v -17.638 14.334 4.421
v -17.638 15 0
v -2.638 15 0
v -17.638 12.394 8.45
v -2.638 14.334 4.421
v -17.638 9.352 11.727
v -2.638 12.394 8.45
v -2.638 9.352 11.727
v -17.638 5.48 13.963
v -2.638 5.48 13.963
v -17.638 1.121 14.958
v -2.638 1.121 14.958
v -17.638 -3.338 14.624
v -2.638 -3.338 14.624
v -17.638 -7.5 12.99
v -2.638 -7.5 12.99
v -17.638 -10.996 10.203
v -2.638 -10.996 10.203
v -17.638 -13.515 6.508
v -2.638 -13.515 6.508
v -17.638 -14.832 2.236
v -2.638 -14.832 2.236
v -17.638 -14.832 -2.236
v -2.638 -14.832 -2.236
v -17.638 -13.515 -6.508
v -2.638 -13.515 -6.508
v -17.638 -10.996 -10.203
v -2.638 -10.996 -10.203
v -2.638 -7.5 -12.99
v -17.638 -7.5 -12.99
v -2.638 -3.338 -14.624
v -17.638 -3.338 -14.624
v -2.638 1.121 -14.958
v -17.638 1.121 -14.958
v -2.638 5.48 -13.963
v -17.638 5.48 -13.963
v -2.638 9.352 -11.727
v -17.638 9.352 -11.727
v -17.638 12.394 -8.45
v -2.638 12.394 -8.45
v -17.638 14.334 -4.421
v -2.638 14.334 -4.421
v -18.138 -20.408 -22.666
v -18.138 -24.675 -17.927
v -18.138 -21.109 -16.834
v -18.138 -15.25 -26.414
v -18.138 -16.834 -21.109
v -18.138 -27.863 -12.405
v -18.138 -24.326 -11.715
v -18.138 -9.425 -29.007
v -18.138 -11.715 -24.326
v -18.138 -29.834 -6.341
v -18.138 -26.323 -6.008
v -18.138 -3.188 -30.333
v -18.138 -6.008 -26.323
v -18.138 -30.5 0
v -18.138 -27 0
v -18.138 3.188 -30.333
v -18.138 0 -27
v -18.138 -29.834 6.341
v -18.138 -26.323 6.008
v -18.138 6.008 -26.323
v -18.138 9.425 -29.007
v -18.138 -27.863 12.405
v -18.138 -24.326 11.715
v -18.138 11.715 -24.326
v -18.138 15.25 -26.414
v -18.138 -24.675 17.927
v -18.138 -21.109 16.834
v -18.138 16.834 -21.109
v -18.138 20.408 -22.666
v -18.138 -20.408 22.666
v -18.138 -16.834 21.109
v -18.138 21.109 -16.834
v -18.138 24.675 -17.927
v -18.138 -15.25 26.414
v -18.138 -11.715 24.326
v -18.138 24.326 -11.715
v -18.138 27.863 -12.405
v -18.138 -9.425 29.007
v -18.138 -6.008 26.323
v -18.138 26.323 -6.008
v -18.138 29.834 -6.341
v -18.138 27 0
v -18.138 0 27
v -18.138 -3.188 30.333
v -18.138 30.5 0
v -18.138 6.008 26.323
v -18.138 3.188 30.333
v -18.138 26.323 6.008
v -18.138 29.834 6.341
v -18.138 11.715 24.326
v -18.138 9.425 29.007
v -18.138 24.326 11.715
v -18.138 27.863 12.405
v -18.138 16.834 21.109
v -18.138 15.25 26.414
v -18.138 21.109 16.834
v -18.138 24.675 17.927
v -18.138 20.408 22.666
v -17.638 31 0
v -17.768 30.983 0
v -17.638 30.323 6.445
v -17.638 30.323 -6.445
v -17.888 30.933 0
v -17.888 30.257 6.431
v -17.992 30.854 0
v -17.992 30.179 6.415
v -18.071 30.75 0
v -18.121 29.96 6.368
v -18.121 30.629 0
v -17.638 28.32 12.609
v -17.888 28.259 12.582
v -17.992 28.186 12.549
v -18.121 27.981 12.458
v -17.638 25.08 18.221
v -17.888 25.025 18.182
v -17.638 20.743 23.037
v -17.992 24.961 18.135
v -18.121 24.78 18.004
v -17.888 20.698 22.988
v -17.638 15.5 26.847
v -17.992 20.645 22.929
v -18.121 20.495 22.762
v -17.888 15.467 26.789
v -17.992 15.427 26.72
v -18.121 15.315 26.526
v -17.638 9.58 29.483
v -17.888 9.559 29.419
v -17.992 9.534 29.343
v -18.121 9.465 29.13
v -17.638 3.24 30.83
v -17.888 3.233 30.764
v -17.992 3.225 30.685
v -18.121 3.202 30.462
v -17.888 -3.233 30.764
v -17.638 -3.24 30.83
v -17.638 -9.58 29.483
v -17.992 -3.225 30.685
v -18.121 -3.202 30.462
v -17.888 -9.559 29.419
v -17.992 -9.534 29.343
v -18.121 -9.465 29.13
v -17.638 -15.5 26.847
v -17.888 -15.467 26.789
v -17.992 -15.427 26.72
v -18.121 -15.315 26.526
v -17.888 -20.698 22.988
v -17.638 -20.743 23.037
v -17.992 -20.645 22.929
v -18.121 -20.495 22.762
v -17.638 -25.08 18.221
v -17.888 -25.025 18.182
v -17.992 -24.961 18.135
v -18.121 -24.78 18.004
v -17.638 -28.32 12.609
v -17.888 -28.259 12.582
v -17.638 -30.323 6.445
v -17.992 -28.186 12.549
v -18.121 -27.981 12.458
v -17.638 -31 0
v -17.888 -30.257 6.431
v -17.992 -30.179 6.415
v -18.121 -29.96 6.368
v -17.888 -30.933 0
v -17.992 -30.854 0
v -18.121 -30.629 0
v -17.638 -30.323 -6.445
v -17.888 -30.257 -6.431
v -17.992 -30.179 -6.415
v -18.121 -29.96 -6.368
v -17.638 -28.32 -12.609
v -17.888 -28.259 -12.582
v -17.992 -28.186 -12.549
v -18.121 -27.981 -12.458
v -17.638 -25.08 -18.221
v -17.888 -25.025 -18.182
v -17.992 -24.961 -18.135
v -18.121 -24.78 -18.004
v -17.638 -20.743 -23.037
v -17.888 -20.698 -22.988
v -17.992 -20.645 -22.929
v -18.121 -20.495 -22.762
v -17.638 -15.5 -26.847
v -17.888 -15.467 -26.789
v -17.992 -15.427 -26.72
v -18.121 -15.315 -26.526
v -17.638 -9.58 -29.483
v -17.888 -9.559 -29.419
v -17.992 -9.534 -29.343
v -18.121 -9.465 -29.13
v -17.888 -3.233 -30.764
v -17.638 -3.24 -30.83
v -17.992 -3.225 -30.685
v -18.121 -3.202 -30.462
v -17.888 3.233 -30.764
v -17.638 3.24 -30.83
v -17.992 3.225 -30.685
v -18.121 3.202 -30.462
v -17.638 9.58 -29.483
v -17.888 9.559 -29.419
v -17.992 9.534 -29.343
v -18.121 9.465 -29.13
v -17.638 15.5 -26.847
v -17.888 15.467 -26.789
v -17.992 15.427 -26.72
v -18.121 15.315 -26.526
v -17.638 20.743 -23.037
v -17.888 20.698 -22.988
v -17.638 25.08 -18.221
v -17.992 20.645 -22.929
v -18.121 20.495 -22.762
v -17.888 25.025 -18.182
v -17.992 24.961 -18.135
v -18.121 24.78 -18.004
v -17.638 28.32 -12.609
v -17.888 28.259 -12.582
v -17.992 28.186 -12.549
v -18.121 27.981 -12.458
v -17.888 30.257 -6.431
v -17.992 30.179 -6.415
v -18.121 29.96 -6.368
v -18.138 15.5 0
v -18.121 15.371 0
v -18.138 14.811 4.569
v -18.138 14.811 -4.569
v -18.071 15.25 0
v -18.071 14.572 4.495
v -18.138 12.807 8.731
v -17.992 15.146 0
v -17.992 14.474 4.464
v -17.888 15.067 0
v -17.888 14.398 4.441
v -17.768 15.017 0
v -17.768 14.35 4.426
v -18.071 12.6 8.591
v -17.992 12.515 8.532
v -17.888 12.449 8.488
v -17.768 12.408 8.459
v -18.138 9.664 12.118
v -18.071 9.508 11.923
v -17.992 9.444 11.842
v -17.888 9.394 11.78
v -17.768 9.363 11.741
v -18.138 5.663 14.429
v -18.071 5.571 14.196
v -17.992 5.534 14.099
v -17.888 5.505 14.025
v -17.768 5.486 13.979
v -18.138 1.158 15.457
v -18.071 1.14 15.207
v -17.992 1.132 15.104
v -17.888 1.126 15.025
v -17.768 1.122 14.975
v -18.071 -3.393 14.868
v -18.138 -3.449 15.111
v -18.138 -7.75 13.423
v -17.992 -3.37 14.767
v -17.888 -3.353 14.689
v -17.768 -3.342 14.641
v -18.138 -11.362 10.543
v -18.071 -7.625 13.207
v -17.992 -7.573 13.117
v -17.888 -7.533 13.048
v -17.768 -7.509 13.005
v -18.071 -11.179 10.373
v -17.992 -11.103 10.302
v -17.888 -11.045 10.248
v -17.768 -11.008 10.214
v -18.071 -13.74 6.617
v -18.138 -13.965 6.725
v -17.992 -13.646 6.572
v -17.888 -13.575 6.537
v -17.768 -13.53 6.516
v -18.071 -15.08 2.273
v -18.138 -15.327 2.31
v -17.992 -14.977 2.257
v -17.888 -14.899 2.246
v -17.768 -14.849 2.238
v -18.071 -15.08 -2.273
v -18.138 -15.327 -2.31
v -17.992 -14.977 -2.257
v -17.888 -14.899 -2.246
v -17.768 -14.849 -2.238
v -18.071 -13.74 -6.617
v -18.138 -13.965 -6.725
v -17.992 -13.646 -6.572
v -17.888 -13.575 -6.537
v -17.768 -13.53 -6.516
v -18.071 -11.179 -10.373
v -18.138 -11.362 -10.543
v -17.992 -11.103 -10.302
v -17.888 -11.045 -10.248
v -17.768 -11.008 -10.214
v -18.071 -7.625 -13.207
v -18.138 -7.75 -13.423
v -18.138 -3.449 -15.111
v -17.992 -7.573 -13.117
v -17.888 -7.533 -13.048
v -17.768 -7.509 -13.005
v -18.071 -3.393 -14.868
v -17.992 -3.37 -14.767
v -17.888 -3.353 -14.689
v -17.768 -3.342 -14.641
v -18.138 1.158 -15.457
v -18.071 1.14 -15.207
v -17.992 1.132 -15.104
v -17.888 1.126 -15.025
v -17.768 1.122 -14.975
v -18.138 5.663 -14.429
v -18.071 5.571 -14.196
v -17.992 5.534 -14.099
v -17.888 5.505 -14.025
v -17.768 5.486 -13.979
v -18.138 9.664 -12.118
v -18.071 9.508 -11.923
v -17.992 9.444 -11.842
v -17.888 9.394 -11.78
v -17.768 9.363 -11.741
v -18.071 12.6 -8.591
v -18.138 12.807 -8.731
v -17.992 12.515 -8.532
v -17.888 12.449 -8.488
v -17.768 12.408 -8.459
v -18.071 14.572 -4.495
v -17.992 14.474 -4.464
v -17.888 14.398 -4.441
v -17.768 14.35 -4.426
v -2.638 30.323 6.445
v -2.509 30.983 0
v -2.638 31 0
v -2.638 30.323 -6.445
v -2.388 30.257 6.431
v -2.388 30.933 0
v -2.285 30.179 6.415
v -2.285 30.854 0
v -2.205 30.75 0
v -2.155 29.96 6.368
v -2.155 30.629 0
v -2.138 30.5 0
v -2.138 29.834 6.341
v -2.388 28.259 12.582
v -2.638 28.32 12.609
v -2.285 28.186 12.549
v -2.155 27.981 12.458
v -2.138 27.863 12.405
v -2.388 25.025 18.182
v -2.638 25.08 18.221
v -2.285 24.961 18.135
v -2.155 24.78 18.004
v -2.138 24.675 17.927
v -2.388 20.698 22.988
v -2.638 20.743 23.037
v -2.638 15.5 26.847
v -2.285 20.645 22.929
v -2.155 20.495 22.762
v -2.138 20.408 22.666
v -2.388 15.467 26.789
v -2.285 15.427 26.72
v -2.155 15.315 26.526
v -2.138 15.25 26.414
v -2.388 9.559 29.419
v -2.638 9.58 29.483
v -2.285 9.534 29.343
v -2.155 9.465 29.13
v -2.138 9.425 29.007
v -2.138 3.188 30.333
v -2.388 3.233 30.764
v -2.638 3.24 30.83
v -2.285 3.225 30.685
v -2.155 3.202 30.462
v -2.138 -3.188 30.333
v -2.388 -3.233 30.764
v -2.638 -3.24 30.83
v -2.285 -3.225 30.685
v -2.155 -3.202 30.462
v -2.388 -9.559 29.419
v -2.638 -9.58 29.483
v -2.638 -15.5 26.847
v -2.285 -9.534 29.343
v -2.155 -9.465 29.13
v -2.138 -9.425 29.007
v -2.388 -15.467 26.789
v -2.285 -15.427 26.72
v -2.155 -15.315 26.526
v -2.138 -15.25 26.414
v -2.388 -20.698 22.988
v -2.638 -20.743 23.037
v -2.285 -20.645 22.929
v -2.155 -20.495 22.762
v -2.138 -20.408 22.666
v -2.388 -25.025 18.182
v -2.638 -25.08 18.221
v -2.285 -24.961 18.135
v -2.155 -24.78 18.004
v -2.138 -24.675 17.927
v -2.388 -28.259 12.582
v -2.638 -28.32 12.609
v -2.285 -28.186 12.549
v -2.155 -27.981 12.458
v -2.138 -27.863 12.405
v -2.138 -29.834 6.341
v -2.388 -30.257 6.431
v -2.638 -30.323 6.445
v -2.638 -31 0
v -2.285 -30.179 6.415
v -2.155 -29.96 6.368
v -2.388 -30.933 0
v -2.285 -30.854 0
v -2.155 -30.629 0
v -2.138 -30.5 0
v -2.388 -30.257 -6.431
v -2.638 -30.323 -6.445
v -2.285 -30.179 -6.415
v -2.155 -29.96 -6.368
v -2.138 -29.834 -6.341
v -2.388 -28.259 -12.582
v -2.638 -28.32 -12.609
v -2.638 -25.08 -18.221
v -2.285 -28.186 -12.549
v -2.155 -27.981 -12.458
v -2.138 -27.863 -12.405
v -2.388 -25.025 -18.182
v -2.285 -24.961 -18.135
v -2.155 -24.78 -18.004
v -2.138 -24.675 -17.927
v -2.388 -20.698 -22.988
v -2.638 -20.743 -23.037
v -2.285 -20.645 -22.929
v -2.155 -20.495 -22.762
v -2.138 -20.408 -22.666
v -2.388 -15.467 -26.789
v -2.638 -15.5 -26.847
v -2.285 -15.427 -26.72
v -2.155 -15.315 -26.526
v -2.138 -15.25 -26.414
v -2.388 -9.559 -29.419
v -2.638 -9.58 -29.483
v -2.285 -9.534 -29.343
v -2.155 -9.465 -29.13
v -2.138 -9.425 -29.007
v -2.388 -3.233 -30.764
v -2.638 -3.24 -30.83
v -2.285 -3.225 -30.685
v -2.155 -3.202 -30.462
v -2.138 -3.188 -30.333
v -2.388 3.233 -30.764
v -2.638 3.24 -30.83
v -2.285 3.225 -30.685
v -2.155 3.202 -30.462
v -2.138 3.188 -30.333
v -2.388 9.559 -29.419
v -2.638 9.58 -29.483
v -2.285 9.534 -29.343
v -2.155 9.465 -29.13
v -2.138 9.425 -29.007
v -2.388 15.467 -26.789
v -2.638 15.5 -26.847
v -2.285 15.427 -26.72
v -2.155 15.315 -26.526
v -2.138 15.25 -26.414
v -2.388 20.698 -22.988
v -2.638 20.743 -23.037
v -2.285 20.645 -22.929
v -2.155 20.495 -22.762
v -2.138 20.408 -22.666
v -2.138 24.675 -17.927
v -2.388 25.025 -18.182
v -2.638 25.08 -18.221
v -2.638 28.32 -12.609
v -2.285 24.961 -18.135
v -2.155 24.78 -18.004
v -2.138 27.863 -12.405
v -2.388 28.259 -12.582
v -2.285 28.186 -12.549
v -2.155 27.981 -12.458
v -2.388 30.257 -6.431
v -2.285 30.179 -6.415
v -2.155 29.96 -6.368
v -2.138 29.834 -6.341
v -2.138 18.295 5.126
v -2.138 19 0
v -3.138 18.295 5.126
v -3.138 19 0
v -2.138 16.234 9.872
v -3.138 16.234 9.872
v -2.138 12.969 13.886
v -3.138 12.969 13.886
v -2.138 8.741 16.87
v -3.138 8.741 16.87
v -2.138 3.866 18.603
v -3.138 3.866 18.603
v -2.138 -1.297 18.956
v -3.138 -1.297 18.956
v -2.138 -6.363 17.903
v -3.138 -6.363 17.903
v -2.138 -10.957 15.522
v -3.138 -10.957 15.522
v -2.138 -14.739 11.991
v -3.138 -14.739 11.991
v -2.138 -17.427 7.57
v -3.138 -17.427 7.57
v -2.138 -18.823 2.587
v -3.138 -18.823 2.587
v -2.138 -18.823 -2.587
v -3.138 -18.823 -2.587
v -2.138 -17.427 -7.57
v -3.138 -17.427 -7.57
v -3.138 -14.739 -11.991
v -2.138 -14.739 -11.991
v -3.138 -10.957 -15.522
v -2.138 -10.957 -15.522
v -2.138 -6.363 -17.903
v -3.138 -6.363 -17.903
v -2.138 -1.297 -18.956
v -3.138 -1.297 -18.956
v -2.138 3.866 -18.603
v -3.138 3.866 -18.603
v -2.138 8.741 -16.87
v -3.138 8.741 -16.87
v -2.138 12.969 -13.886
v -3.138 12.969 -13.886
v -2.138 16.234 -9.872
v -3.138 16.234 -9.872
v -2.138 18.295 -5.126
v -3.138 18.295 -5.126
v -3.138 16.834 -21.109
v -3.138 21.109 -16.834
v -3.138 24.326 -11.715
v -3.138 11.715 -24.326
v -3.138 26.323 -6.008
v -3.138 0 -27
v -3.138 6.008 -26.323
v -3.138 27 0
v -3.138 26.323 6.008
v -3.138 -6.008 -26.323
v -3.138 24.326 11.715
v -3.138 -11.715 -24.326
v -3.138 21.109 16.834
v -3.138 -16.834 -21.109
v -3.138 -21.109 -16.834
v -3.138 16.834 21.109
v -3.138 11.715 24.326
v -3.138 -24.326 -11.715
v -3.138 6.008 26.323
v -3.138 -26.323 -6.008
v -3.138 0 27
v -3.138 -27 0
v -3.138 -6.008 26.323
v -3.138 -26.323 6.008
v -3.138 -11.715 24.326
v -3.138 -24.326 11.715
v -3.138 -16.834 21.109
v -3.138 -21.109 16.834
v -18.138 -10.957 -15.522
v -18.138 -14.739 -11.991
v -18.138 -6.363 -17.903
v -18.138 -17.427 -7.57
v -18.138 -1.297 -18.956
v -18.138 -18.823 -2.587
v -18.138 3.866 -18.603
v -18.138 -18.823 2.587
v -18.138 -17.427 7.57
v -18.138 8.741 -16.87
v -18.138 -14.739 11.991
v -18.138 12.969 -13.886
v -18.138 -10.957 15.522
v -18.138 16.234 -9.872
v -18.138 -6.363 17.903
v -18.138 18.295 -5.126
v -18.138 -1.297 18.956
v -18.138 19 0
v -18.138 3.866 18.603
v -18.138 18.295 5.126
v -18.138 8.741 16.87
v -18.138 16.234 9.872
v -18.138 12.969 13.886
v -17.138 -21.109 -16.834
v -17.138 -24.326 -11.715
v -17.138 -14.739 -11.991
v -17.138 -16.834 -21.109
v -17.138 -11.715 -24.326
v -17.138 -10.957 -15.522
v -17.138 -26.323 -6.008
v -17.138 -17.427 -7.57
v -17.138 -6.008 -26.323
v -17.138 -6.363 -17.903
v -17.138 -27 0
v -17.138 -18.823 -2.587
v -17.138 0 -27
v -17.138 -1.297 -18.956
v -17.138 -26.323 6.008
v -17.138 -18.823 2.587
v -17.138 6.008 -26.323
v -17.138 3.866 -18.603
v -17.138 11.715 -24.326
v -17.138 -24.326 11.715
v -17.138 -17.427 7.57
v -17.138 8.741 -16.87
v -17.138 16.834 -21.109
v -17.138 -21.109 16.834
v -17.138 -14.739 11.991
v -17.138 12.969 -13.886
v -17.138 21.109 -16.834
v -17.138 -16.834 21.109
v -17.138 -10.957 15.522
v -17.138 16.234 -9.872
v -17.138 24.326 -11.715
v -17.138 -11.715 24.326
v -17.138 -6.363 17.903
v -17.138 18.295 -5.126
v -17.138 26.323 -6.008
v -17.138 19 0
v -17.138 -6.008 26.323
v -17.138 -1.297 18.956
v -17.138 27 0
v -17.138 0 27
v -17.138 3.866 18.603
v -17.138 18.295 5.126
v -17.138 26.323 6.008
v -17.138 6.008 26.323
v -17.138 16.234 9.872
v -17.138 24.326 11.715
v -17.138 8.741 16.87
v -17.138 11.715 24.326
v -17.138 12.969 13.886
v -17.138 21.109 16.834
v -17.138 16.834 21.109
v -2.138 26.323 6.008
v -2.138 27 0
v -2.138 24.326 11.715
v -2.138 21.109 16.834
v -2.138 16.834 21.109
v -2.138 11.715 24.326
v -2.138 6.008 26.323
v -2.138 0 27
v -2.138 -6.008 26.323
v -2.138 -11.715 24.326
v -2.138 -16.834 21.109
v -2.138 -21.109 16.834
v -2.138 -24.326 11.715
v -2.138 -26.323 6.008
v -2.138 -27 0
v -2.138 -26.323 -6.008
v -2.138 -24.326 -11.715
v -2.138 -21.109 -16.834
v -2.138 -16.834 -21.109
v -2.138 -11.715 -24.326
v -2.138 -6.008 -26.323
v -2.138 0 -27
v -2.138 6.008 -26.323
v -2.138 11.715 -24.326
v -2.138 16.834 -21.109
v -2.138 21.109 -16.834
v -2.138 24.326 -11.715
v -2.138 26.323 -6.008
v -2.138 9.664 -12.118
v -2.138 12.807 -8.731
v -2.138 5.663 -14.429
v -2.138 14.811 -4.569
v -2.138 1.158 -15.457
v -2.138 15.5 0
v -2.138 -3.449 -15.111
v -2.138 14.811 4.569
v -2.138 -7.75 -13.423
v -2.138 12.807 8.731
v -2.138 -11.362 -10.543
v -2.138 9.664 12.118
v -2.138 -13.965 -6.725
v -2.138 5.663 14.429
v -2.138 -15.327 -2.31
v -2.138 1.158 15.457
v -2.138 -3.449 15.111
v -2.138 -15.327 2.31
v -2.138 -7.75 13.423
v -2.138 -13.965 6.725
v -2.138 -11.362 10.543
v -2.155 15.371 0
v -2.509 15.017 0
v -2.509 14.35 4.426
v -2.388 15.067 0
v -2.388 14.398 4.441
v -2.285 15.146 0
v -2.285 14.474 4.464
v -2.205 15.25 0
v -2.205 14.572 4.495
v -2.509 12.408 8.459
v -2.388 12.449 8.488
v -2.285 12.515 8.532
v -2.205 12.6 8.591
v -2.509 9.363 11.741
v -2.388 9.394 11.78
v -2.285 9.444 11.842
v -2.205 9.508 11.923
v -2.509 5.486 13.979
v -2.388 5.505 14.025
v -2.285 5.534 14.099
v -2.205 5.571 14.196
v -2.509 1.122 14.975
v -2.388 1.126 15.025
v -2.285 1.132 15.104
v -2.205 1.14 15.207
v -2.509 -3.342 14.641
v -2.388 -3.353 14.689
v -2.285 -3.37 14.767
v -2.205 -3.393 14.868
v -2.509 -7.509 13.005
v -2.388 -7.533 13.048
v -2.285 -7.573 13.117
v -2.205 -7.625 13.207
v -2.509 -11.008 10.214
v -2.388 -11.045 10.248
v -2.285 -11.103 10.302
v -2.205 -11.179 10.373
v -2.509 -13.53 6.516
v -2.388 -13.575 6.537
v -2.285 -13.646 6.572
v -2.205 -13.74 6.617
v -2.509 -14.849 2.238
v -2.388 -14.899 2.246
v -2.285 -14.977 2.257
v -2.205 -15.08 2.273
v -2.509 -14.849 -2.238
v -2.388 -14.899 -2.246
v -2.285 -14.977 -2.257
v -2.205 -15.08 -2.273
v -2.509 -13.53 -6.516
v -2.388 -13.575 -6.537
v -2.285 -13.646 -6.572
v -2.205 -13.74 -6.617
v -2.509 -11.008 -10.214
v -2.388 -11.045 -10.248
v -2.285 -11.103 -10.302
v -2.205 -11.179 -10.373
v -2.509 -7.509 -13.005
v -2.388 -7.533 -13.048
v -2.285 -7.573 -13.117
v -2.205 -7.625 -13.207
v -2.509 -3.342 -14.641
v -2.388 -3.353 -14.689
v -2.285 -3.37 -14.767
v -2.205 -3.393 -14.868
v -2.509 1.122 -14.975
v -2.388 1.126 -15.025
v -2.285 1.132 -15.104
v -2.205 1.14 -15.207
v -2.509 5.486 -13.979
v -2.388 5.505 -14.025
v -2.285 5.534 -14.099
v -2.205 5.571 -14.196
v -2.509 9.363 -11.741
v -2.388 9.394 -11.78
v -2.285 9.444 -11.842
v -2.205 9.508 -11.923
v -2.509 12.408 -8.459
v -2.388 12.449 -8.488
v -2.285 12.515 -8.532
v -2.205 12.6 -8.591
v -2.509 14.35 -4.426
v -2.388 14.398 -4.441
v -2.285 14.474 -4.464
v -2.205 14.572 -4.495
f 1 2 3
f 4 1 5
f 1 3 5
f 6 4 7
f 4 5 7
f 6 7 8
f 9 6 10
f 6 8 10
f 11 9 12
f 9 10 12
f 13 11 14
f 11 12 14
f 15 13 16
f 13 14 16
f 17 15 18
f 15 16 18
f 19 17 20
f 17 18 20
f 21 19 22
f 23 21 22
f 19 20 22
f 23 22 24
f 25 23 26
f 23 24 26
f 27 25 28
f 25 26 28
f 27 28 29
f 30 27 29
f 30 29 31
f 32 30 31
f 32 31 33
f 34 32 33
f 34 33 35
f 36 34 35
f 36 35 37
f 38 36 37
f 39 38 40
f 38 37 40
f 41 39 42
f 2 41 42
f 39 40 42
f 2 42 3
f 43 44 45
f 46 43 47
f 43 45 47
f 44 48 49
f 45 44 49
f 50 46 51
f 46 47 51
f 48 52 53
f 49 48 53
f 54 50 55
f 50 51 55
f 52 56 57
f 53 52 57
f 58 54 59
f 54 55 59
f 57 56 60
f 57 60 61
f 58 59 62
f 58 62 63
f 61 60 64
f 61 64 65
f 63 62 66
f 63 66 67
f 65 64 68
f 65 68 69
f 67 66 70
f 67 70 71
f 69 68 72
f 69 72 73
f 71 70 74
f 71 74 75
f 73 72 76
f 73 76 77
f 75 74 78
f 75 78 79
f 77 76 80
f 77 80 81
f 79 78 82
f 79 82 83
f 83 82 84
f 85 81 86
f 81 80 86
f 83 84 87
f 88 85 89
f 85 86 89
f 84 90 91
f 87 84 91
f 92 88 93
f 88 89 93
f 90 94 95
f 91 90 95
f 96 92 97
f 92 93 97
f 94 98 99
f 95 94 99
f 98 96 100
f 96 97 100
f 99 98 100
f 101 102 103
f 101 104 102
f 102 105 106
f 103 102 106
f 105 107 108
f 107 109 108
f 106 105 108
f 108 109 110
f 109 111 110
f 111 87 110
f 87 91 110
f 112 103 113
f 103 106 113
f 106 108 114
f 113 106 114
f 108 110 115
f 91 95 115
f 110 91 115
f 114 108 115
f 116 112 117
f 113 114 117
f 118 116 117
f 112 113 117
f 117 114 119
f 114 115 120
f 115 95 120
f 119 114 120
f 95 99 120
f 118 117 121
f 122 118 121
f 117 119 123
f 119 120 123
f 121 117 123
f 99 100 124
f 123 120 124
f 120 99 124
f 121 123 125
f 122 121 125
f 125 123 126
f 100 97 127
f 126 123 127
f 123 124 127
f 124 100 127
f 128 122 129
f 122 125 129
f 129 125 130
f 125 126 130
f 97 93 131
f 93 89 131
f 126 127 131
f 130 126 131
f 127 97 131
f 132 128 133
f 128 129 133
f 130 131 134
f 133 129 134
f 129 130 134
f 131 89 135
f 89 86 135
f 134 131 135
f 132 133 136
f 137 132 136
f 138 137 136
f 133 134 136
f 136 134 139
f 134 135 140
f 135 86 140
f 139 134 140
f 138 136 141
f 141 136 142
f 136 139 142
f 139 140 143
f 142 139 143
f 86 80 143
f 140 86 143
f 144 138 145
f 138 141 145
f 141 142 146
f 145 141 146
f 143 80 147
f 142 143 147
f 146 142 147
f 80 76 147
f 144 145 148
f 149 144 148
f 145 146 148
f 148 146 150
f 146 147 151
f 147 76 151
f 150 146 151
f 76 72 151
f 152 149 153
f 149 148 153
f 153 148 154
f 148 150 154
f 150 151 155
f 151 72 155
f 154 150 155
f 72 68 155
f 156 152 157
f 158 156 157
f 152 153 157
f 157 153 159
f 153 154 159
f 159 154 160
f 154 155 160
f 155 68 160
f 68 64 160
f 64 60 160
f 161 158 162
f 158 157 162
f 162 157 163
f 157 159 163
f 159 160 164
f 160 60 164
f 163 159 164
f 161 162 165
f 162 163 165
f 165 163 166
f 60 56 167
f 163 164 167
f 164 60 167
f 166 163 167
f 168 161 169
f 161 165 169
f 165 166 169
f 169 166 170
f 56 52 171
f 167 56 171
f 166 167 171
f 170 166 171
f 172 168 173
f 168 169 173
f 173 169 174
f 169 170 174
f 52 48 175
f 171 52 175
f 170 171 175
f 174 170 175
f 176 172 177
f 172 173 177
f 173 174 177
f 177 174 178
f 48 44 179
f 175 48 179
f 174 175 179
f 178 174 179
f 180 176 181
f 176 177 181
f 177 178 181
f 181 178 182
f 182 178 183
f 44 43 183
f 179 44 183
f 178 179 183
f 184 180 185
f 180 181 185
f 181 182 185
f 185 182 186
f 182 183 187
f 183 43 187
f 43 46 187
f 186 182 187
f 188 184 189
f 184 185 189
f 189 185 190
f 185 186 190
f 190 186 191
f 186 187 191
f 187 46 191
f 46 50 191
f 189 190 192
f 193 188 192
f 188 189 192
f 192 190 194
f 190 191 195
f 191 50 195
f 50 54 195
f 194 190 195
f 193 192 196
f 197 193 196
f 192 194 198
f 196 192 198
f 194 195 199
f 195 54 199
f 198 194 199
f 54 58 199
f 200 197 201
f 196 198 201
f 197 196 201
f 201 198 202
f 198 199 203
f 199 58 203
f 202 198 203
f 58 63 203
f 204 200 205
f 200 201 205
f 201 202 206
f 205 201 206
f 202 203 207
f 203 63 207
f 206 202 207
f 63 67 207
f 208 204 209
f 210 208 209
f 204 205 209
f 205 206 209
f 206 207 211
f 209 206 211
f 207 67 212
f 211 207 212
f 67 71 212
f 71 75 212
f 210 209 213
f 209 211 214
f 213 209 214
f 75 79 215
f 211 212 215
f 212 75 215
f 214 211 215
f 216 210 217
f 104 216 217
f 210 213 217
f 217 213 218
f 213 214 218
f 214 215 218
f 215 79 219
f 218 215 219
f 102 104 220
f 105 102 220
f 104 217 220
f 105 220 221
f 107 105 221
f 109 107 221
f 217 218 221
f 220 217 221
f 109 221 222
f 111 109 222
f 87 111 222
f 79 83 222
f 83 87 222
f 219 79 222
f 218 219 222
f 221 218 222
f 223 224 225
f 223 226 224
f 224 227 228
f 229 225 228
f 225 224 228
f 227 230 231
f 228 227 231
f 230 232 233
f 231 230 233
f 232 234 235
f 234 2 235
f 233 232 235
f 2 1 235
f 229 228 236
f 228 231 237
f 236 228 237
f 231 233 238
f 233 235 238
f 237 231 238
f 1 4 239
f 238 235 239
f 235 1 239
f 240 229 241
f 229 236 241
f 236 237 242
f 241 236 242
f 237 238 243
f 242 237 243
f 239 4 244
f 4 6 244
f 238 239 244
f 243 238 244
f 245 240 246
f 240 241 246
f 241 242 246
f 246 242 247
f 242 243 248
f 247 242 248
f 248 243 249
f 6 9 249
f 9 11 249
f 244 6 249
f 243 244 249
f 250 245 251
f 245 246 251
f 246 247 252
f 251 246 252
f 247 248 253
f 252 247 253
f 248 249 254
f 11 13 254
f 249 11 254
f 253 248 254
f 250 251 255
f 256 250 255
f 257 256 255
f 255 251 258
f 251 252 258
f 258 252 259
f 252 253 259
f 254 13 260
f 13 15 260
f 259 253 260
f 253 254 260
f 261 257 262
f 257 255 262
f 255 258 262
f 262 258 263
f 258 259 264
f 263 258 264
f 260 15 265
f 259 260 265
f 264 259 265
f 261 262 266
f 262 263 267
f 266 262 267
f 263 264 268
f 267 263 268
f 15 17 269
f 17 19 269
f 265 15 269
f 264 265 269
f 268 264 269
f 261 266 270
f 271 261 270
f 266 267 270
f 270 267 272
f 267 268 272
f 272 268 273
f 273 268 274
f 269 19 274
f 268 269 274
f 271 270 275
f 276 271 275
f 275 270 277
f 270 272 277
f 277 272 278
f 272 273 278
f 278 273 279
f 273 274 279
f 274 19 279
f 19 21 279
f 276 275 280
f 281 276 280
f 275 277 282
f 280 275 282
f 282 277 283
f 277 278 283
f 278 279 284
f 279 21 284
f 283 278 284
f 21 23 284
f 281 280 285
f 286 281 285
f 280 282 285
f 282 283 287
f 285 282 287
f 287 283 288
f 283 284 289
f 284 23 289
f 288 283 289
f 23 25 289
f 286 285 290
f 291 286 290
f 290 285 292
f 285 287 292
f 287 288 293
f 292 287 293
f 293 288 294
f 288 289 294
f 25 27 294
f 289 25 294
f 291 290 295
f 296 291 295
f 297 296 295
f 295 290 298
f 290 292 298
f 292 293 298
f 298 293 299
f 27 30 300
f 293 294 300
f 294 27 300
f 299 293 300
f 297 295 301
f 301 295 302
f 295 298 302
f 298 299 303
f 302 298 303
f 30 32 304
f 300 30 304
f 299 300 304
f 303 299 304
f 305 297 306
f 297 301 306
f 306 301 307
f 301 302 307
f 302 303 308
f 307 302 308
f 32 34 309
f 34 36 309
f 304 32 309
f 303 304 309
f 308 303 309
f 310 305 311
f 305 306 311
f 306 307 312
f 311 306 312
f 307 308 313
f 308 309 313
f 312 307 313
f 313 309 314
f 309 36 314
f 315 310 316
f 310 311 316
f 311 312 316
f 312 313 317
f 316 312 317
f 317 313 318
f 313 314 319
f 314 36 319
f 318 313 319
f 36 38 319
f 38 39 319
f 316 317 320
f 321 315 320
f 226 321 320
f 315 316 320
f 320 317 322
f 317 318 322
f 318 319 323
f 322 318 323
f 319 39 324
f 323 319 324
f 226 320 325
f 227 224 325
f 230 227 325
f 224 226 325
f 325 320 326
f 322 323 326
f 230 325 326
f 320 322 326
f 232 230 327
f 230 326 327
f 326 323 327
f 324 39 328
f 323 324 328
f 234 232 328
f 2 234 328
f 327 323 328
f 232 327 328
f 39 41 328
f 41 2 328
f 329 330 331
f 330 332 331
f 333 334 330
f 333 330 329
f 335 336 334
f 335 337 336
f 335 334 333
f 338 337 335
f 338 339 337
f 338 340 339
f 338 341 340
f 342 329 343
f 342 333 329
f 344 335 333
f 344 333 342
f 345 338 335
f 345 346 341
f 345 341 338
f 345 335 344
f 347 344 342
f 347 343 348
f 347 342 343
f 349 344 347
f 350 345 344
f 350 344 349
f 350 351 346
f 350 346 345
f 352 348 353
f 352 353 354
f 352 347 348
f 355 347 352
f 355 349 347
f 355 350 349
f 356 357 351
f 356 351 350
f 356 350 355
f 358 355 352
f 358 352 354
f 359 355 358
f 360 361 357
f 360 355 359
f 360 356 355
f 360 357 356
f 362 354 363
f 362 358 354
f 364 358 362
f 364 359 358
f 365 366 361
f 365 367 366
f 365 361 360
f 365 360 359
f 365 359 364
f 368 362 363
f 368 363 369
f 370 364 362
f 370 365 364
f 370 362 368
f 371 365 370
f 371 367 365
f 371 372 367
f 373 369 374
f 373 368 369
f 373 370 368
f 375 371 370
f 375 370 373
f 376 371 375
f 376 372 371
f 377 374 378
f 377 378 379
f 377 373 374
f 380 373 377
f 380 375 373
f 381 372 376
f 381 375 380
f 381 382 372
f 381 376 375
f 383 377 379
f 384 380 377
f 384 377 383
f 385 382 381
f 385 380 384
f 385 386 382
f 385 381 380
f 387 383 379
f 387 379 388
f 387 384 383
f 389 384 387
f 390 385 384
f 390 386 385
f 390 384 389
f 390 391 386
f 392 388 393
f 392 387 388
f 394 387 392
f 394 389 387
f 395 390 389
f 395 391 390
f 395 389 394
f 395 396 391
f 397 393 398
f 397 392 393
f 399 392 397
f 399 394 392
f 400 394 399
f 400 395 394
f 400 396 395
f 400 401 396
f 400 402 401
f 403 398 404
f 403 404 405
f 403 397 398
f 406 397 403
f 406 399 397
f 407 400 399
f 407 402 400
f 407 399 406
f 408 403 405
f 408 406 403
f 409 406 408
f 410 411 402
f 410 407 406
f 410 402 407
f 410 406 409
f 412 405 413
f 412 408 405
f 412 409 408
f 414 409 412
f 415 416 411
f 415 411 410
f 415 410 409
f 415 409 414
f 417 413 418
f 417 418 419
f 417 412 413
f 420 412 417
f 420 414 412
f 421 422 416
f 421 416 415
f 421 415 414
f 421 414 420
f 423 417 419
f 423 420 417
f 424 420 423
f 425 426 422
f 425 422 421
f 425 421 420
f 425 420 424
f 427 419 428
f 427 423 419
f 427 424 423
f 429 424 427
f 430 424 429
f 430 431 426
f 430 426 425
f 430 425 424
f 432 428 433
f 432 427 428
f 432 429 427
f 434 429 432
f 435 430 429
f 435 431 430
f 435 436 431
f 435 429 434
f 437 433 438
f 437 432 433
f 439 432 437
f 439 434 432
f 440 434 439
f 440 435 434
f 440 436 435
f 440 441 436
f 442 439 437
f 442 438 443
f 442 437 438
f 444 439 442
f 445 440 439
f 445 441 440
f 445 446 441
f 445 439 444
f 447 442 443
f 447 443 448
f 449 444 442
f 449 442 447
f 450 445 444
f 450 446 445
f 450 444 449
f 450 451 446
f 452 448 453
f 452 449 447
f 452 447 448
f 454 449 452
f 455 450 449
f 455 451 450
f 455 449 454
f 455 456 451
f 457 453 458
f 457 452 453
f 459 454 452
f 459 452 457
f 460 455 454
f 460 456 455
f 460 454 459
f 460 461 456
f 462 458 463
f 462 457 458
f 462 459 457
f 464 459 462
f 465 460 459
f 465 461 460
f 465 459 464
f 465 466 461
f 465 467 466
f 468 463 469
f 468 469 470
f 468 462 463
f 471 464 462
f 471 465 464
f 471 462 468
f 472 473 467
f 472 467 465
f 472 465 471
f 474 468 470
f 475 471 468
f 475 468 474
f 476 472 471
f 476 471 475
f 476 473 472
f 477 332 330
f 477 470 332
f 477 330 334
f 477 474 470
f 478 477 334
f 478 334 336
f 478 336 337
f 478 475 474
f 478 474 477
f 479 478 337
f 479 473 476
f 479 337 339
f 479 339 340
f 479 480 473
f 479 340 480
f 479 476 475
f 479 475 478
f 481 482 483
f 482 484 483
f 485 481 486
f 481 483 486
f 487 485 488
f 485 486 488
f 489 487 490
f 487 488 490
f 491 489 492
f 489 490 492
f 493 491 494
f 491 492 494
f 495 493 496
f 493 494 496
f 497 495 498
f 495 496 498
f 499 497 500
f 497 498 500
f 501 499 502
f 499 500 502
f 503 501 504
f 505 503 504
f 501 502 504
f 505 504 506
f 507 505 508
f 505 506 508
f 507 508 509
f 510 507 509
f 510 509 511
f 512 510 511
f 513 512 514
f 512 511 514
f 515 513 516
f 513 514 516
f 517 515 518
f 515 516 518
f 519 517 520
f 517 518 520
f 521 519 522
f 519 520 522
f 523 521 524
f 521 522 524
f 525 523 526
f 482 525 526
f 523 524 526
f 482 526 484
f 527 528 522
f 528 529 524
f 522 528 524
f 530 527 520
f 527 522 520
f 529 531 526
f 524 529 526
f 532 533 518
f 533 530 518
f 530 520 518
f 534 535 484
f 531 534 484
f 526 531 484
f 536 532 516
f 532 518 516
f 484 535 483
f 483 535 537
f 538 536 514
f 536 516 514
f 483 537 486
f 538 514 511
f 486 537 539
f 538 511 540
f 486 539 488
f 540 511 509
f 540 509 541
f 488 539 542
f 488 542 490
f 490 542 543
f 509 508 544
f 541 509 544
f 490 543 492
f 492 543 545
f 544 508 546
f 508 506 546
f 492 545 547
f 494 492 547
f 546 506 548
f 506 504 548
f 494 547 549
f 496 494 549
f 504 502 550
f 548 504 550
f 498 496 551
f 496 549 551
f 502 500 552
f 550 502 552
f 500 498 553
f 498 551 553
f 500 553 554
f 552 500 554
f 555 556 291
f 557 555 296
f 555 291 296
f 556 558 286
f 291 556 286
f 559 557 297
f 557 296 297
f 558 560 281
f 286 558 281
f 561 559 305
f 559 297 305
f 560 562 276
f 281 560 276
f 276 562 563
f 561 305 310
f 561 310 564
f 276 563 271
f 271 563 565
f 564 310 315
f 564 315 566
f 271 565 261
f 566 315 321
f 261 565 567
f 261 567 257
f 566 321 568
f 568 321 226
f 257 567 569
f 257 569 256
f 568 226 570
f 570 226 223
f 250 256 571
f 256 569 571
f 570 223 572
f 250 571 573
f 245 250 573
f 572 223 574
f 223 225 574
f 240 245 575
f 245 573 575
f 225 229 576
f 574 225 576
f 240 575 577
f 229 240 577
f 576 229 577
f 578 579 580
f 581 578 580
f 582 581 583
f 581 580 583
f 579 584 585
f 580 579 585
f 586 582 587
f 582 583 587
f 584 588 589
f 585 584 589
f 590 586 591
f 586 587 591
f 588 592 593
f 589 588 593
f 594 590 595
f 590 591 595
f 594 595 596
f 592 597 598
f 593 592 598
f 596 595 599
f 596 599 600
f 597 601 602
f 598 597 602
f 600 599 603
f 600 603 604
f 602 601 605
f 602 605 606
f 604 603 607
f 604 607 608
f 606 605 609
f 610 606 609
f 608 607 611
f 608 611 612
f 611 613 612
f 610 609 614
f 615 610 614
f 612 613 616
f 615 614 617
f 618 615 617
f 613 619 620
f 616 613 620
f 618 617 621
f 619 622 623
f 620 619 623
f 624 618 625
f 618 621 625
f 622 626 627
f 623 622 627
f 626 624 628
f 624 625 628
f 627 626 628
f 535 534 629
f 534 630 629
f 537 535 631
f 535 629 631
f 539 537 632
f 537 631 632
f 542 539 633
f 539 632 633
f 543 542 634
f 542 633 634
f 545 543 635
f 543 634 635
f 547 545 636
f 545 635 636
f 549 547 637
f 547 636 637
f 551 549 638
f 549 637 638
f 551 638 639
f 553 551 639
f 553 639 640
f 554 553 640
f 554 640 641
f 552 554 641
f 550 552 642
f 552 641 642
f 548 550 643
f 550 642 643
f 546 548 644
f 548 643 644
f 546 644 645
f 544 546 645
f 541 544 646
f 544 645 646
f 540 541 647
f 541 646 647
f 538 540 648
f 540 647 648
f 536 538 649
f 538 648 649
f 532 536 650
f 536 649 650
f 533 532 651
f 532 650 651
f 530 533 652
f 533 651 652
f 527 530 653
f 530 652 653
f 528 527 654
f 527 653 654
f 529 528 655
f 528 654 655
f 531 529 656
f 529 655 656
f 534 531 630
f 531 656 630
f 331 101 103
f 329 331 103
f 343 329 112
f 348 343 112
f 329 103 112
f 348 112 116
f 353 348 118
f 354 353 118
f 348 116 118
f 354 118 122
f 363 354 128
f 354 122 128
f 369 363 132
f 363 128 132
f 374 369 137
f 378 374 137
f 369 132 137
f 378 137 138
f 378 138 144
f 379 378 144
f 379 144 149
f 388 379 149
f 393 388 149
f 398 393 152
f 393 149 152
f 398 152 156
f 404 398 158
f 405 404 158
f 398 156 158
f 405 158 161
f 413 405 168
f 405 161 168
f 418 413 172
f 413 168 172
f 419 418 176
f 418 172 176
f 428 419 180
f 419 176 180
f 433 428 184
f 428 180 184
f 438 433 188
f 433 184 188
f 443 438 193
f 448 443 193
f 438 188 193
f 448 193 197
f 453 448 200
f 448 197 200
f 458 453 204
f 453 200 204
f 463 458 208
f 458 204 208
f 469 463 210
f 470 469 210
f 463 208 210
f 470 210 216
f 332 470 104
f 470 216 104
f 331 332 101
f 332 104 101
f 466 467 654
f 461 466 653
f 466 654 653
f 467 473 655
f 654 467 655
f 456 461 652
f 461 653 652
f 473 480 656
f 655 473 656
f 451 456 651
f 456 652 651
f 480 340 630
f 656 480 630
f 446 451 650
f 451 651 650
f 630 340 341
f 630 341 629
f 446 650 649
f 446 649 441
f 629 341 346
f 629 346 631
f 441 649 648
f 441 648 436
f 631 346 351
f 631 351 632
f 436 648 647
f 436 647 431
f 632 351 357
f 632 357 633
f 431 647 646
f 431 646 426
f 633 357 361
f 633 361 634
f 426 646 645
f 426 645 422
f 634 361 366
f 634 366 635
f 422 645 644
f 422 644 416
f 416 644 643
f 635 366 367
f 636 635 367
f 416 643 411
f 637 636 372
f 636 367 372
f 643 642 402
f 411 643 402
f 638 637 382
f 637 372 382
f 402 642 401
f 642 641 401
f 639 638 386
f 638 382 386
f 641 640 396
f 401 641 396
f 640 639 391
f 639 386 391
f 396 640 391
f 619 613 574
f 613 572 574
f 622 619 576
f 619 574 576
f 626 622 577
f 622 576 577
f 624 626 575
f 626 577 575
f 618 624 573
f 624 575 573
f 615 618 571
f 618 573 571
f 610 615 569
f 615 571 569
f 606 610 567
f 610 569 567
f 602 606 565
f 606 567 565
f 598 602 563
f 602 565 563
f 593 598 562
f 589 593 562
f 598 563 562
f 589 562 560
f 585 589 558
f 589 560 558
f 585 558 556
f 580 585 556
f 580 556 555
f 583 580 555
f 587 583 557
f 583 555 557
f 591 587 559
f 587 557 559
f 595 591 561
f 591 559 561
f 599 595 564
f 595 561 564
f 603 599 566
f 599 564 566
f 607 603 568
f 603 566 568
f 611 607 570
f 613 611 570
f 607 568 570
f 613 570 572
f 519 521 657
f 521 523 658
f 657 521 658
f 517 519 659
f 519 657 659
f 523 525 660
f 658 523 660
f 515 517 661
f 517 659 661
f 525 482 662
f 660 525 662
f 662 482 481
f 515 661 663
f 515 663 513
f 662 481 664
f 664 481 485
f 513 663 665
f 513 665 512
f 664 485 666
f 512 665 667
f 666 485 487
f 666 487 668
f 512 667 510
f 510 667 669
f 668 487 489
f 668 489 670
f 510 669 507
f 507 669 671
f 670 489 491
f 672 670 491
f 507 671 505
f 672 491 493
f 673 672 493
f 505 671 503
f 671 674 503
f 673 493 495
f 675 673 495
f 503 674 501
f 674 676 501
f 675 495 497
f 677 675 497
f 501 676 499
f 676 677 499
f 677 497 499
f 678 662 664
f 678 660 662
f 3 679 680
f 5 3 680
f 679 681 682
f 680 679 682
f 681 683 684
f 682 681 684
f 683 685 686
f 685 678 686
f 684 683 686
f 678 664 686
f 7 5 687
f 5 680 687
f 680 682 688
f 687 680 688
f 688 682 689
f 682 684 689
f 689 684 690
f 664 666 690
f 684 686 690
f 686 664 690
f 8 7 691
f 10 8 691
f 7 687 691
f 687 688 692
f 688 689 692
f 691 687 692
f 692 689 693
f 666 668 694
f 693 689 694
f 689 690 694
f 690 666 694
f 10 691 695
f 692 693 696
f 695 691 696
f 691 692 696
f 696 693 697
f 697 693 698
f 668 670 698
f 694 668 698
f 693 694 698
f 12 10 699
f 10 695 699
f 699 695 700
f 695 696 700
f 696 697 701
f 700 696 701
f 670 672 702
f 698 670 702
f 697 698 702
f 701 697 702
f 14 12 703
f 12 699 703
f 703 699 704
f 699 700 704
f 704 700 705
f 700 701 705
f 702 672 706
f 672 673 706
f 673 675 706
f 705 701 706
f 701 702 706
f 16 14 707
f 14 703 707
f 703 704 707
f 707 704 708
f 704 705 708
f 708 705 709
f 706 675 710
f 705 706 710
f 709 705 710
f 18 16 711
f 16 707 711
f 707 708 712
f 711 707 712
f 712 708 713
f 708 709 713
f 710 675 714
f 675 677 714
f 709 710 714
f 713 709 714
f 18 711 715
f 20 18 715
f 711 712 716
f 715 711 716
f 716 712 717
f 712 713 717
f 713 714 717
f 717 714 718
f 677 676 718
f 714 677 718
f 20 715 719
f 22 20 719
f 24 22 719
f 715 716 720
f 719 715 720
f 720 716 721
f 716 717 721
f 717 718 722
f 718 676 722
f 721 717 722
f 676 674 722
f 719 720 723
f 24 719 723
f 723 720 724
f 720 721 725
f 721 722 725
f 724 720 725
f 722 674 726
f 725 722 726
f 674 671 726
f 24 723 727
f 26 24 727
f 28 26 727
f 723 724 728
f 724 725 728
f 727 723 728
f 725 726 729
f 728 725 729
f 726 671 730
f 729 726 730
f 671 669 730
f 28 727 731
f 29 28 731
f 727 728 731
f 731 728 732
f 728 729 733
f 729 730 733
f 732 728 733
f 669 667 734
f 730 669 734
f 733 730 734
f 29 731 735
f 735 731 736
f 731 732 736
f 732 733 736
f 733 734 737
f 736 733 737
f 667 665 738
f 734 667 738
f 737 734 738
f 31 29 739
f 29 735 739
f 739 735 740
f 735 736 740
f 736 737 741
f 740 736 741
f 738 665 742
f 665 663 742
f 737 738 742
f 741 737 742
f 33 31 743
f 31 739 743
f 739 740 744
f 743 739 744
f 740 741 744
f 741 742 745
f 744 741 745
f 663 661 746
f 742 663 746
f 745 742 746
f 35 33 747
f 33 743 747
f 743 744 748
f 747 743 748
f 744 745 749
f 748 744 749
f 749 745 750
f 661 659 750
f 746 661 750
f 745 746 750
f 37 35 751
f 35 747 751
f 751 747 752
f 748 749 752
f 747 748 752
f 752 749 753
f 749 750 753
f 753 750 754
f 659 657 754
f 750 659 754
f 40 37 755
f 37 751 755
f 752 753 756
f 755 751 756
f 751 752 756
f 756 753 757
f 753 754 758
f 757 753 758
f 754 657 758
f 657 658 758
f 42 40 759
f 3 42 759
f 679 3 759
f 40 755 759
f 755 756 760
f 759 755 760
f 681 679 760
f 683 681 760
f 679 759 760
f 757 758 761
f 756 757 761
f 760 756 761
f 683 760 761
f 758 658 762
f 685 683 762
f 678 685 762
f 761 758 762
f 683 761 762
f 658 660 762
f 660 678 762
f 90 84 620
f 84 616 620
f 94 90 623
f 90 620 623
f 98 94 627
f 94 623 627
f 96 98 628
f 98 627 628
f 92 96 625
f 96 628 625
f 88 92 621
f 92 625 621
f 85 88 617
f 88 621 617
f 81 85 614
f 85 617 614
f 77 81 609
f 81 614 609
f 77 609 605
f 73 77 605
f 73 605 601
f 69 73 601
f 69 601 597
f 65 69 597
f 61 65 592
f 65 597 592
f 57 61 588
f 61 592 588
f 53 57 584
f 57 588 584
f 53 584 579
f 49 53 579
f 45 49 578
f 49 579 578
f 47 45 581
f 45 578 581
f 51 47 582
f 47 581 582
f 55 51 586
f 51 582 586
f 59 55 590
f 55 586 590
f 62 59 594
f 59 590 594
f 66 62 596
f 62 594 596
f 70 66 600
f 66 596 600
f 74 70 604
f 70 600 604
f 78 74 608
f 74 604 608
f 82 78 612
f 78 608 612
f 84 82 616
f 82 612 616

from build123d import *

# Parameters (mm, degrees)
FILLET_R = 0.5


with BuildPart() as part:
    # Sketch → Revolution (revolve)
    with BuildSketch(Plane.XY):
        Polygon((-2.138438, 31), (-18.138438, 31), (-18.138438, 27), (-17.138438, 27), (-17.138438, 19), (-18.138438, 19), (-18.138438, 15), (-2.138438, 15), (-2.138438, 19), (-3.138438, 19), (-3.138438, 27), (-2.138438, 27), align=None)
    revolve(axis=Axis((0, 0, 0), (1, 0, 0)))

    # Fillet
    fillet_edges = [part.edges().sort_by_distance(p)[0] for p in [
        (-2.138438, -31, 0),
        (-2.138438, -15, 0),
        (-18.138438, -31, 0),
        (-18.138438, -15, 0),
    ]]
    fillet(fillet_edges, radius=FILLET_R)


solid = part.part
